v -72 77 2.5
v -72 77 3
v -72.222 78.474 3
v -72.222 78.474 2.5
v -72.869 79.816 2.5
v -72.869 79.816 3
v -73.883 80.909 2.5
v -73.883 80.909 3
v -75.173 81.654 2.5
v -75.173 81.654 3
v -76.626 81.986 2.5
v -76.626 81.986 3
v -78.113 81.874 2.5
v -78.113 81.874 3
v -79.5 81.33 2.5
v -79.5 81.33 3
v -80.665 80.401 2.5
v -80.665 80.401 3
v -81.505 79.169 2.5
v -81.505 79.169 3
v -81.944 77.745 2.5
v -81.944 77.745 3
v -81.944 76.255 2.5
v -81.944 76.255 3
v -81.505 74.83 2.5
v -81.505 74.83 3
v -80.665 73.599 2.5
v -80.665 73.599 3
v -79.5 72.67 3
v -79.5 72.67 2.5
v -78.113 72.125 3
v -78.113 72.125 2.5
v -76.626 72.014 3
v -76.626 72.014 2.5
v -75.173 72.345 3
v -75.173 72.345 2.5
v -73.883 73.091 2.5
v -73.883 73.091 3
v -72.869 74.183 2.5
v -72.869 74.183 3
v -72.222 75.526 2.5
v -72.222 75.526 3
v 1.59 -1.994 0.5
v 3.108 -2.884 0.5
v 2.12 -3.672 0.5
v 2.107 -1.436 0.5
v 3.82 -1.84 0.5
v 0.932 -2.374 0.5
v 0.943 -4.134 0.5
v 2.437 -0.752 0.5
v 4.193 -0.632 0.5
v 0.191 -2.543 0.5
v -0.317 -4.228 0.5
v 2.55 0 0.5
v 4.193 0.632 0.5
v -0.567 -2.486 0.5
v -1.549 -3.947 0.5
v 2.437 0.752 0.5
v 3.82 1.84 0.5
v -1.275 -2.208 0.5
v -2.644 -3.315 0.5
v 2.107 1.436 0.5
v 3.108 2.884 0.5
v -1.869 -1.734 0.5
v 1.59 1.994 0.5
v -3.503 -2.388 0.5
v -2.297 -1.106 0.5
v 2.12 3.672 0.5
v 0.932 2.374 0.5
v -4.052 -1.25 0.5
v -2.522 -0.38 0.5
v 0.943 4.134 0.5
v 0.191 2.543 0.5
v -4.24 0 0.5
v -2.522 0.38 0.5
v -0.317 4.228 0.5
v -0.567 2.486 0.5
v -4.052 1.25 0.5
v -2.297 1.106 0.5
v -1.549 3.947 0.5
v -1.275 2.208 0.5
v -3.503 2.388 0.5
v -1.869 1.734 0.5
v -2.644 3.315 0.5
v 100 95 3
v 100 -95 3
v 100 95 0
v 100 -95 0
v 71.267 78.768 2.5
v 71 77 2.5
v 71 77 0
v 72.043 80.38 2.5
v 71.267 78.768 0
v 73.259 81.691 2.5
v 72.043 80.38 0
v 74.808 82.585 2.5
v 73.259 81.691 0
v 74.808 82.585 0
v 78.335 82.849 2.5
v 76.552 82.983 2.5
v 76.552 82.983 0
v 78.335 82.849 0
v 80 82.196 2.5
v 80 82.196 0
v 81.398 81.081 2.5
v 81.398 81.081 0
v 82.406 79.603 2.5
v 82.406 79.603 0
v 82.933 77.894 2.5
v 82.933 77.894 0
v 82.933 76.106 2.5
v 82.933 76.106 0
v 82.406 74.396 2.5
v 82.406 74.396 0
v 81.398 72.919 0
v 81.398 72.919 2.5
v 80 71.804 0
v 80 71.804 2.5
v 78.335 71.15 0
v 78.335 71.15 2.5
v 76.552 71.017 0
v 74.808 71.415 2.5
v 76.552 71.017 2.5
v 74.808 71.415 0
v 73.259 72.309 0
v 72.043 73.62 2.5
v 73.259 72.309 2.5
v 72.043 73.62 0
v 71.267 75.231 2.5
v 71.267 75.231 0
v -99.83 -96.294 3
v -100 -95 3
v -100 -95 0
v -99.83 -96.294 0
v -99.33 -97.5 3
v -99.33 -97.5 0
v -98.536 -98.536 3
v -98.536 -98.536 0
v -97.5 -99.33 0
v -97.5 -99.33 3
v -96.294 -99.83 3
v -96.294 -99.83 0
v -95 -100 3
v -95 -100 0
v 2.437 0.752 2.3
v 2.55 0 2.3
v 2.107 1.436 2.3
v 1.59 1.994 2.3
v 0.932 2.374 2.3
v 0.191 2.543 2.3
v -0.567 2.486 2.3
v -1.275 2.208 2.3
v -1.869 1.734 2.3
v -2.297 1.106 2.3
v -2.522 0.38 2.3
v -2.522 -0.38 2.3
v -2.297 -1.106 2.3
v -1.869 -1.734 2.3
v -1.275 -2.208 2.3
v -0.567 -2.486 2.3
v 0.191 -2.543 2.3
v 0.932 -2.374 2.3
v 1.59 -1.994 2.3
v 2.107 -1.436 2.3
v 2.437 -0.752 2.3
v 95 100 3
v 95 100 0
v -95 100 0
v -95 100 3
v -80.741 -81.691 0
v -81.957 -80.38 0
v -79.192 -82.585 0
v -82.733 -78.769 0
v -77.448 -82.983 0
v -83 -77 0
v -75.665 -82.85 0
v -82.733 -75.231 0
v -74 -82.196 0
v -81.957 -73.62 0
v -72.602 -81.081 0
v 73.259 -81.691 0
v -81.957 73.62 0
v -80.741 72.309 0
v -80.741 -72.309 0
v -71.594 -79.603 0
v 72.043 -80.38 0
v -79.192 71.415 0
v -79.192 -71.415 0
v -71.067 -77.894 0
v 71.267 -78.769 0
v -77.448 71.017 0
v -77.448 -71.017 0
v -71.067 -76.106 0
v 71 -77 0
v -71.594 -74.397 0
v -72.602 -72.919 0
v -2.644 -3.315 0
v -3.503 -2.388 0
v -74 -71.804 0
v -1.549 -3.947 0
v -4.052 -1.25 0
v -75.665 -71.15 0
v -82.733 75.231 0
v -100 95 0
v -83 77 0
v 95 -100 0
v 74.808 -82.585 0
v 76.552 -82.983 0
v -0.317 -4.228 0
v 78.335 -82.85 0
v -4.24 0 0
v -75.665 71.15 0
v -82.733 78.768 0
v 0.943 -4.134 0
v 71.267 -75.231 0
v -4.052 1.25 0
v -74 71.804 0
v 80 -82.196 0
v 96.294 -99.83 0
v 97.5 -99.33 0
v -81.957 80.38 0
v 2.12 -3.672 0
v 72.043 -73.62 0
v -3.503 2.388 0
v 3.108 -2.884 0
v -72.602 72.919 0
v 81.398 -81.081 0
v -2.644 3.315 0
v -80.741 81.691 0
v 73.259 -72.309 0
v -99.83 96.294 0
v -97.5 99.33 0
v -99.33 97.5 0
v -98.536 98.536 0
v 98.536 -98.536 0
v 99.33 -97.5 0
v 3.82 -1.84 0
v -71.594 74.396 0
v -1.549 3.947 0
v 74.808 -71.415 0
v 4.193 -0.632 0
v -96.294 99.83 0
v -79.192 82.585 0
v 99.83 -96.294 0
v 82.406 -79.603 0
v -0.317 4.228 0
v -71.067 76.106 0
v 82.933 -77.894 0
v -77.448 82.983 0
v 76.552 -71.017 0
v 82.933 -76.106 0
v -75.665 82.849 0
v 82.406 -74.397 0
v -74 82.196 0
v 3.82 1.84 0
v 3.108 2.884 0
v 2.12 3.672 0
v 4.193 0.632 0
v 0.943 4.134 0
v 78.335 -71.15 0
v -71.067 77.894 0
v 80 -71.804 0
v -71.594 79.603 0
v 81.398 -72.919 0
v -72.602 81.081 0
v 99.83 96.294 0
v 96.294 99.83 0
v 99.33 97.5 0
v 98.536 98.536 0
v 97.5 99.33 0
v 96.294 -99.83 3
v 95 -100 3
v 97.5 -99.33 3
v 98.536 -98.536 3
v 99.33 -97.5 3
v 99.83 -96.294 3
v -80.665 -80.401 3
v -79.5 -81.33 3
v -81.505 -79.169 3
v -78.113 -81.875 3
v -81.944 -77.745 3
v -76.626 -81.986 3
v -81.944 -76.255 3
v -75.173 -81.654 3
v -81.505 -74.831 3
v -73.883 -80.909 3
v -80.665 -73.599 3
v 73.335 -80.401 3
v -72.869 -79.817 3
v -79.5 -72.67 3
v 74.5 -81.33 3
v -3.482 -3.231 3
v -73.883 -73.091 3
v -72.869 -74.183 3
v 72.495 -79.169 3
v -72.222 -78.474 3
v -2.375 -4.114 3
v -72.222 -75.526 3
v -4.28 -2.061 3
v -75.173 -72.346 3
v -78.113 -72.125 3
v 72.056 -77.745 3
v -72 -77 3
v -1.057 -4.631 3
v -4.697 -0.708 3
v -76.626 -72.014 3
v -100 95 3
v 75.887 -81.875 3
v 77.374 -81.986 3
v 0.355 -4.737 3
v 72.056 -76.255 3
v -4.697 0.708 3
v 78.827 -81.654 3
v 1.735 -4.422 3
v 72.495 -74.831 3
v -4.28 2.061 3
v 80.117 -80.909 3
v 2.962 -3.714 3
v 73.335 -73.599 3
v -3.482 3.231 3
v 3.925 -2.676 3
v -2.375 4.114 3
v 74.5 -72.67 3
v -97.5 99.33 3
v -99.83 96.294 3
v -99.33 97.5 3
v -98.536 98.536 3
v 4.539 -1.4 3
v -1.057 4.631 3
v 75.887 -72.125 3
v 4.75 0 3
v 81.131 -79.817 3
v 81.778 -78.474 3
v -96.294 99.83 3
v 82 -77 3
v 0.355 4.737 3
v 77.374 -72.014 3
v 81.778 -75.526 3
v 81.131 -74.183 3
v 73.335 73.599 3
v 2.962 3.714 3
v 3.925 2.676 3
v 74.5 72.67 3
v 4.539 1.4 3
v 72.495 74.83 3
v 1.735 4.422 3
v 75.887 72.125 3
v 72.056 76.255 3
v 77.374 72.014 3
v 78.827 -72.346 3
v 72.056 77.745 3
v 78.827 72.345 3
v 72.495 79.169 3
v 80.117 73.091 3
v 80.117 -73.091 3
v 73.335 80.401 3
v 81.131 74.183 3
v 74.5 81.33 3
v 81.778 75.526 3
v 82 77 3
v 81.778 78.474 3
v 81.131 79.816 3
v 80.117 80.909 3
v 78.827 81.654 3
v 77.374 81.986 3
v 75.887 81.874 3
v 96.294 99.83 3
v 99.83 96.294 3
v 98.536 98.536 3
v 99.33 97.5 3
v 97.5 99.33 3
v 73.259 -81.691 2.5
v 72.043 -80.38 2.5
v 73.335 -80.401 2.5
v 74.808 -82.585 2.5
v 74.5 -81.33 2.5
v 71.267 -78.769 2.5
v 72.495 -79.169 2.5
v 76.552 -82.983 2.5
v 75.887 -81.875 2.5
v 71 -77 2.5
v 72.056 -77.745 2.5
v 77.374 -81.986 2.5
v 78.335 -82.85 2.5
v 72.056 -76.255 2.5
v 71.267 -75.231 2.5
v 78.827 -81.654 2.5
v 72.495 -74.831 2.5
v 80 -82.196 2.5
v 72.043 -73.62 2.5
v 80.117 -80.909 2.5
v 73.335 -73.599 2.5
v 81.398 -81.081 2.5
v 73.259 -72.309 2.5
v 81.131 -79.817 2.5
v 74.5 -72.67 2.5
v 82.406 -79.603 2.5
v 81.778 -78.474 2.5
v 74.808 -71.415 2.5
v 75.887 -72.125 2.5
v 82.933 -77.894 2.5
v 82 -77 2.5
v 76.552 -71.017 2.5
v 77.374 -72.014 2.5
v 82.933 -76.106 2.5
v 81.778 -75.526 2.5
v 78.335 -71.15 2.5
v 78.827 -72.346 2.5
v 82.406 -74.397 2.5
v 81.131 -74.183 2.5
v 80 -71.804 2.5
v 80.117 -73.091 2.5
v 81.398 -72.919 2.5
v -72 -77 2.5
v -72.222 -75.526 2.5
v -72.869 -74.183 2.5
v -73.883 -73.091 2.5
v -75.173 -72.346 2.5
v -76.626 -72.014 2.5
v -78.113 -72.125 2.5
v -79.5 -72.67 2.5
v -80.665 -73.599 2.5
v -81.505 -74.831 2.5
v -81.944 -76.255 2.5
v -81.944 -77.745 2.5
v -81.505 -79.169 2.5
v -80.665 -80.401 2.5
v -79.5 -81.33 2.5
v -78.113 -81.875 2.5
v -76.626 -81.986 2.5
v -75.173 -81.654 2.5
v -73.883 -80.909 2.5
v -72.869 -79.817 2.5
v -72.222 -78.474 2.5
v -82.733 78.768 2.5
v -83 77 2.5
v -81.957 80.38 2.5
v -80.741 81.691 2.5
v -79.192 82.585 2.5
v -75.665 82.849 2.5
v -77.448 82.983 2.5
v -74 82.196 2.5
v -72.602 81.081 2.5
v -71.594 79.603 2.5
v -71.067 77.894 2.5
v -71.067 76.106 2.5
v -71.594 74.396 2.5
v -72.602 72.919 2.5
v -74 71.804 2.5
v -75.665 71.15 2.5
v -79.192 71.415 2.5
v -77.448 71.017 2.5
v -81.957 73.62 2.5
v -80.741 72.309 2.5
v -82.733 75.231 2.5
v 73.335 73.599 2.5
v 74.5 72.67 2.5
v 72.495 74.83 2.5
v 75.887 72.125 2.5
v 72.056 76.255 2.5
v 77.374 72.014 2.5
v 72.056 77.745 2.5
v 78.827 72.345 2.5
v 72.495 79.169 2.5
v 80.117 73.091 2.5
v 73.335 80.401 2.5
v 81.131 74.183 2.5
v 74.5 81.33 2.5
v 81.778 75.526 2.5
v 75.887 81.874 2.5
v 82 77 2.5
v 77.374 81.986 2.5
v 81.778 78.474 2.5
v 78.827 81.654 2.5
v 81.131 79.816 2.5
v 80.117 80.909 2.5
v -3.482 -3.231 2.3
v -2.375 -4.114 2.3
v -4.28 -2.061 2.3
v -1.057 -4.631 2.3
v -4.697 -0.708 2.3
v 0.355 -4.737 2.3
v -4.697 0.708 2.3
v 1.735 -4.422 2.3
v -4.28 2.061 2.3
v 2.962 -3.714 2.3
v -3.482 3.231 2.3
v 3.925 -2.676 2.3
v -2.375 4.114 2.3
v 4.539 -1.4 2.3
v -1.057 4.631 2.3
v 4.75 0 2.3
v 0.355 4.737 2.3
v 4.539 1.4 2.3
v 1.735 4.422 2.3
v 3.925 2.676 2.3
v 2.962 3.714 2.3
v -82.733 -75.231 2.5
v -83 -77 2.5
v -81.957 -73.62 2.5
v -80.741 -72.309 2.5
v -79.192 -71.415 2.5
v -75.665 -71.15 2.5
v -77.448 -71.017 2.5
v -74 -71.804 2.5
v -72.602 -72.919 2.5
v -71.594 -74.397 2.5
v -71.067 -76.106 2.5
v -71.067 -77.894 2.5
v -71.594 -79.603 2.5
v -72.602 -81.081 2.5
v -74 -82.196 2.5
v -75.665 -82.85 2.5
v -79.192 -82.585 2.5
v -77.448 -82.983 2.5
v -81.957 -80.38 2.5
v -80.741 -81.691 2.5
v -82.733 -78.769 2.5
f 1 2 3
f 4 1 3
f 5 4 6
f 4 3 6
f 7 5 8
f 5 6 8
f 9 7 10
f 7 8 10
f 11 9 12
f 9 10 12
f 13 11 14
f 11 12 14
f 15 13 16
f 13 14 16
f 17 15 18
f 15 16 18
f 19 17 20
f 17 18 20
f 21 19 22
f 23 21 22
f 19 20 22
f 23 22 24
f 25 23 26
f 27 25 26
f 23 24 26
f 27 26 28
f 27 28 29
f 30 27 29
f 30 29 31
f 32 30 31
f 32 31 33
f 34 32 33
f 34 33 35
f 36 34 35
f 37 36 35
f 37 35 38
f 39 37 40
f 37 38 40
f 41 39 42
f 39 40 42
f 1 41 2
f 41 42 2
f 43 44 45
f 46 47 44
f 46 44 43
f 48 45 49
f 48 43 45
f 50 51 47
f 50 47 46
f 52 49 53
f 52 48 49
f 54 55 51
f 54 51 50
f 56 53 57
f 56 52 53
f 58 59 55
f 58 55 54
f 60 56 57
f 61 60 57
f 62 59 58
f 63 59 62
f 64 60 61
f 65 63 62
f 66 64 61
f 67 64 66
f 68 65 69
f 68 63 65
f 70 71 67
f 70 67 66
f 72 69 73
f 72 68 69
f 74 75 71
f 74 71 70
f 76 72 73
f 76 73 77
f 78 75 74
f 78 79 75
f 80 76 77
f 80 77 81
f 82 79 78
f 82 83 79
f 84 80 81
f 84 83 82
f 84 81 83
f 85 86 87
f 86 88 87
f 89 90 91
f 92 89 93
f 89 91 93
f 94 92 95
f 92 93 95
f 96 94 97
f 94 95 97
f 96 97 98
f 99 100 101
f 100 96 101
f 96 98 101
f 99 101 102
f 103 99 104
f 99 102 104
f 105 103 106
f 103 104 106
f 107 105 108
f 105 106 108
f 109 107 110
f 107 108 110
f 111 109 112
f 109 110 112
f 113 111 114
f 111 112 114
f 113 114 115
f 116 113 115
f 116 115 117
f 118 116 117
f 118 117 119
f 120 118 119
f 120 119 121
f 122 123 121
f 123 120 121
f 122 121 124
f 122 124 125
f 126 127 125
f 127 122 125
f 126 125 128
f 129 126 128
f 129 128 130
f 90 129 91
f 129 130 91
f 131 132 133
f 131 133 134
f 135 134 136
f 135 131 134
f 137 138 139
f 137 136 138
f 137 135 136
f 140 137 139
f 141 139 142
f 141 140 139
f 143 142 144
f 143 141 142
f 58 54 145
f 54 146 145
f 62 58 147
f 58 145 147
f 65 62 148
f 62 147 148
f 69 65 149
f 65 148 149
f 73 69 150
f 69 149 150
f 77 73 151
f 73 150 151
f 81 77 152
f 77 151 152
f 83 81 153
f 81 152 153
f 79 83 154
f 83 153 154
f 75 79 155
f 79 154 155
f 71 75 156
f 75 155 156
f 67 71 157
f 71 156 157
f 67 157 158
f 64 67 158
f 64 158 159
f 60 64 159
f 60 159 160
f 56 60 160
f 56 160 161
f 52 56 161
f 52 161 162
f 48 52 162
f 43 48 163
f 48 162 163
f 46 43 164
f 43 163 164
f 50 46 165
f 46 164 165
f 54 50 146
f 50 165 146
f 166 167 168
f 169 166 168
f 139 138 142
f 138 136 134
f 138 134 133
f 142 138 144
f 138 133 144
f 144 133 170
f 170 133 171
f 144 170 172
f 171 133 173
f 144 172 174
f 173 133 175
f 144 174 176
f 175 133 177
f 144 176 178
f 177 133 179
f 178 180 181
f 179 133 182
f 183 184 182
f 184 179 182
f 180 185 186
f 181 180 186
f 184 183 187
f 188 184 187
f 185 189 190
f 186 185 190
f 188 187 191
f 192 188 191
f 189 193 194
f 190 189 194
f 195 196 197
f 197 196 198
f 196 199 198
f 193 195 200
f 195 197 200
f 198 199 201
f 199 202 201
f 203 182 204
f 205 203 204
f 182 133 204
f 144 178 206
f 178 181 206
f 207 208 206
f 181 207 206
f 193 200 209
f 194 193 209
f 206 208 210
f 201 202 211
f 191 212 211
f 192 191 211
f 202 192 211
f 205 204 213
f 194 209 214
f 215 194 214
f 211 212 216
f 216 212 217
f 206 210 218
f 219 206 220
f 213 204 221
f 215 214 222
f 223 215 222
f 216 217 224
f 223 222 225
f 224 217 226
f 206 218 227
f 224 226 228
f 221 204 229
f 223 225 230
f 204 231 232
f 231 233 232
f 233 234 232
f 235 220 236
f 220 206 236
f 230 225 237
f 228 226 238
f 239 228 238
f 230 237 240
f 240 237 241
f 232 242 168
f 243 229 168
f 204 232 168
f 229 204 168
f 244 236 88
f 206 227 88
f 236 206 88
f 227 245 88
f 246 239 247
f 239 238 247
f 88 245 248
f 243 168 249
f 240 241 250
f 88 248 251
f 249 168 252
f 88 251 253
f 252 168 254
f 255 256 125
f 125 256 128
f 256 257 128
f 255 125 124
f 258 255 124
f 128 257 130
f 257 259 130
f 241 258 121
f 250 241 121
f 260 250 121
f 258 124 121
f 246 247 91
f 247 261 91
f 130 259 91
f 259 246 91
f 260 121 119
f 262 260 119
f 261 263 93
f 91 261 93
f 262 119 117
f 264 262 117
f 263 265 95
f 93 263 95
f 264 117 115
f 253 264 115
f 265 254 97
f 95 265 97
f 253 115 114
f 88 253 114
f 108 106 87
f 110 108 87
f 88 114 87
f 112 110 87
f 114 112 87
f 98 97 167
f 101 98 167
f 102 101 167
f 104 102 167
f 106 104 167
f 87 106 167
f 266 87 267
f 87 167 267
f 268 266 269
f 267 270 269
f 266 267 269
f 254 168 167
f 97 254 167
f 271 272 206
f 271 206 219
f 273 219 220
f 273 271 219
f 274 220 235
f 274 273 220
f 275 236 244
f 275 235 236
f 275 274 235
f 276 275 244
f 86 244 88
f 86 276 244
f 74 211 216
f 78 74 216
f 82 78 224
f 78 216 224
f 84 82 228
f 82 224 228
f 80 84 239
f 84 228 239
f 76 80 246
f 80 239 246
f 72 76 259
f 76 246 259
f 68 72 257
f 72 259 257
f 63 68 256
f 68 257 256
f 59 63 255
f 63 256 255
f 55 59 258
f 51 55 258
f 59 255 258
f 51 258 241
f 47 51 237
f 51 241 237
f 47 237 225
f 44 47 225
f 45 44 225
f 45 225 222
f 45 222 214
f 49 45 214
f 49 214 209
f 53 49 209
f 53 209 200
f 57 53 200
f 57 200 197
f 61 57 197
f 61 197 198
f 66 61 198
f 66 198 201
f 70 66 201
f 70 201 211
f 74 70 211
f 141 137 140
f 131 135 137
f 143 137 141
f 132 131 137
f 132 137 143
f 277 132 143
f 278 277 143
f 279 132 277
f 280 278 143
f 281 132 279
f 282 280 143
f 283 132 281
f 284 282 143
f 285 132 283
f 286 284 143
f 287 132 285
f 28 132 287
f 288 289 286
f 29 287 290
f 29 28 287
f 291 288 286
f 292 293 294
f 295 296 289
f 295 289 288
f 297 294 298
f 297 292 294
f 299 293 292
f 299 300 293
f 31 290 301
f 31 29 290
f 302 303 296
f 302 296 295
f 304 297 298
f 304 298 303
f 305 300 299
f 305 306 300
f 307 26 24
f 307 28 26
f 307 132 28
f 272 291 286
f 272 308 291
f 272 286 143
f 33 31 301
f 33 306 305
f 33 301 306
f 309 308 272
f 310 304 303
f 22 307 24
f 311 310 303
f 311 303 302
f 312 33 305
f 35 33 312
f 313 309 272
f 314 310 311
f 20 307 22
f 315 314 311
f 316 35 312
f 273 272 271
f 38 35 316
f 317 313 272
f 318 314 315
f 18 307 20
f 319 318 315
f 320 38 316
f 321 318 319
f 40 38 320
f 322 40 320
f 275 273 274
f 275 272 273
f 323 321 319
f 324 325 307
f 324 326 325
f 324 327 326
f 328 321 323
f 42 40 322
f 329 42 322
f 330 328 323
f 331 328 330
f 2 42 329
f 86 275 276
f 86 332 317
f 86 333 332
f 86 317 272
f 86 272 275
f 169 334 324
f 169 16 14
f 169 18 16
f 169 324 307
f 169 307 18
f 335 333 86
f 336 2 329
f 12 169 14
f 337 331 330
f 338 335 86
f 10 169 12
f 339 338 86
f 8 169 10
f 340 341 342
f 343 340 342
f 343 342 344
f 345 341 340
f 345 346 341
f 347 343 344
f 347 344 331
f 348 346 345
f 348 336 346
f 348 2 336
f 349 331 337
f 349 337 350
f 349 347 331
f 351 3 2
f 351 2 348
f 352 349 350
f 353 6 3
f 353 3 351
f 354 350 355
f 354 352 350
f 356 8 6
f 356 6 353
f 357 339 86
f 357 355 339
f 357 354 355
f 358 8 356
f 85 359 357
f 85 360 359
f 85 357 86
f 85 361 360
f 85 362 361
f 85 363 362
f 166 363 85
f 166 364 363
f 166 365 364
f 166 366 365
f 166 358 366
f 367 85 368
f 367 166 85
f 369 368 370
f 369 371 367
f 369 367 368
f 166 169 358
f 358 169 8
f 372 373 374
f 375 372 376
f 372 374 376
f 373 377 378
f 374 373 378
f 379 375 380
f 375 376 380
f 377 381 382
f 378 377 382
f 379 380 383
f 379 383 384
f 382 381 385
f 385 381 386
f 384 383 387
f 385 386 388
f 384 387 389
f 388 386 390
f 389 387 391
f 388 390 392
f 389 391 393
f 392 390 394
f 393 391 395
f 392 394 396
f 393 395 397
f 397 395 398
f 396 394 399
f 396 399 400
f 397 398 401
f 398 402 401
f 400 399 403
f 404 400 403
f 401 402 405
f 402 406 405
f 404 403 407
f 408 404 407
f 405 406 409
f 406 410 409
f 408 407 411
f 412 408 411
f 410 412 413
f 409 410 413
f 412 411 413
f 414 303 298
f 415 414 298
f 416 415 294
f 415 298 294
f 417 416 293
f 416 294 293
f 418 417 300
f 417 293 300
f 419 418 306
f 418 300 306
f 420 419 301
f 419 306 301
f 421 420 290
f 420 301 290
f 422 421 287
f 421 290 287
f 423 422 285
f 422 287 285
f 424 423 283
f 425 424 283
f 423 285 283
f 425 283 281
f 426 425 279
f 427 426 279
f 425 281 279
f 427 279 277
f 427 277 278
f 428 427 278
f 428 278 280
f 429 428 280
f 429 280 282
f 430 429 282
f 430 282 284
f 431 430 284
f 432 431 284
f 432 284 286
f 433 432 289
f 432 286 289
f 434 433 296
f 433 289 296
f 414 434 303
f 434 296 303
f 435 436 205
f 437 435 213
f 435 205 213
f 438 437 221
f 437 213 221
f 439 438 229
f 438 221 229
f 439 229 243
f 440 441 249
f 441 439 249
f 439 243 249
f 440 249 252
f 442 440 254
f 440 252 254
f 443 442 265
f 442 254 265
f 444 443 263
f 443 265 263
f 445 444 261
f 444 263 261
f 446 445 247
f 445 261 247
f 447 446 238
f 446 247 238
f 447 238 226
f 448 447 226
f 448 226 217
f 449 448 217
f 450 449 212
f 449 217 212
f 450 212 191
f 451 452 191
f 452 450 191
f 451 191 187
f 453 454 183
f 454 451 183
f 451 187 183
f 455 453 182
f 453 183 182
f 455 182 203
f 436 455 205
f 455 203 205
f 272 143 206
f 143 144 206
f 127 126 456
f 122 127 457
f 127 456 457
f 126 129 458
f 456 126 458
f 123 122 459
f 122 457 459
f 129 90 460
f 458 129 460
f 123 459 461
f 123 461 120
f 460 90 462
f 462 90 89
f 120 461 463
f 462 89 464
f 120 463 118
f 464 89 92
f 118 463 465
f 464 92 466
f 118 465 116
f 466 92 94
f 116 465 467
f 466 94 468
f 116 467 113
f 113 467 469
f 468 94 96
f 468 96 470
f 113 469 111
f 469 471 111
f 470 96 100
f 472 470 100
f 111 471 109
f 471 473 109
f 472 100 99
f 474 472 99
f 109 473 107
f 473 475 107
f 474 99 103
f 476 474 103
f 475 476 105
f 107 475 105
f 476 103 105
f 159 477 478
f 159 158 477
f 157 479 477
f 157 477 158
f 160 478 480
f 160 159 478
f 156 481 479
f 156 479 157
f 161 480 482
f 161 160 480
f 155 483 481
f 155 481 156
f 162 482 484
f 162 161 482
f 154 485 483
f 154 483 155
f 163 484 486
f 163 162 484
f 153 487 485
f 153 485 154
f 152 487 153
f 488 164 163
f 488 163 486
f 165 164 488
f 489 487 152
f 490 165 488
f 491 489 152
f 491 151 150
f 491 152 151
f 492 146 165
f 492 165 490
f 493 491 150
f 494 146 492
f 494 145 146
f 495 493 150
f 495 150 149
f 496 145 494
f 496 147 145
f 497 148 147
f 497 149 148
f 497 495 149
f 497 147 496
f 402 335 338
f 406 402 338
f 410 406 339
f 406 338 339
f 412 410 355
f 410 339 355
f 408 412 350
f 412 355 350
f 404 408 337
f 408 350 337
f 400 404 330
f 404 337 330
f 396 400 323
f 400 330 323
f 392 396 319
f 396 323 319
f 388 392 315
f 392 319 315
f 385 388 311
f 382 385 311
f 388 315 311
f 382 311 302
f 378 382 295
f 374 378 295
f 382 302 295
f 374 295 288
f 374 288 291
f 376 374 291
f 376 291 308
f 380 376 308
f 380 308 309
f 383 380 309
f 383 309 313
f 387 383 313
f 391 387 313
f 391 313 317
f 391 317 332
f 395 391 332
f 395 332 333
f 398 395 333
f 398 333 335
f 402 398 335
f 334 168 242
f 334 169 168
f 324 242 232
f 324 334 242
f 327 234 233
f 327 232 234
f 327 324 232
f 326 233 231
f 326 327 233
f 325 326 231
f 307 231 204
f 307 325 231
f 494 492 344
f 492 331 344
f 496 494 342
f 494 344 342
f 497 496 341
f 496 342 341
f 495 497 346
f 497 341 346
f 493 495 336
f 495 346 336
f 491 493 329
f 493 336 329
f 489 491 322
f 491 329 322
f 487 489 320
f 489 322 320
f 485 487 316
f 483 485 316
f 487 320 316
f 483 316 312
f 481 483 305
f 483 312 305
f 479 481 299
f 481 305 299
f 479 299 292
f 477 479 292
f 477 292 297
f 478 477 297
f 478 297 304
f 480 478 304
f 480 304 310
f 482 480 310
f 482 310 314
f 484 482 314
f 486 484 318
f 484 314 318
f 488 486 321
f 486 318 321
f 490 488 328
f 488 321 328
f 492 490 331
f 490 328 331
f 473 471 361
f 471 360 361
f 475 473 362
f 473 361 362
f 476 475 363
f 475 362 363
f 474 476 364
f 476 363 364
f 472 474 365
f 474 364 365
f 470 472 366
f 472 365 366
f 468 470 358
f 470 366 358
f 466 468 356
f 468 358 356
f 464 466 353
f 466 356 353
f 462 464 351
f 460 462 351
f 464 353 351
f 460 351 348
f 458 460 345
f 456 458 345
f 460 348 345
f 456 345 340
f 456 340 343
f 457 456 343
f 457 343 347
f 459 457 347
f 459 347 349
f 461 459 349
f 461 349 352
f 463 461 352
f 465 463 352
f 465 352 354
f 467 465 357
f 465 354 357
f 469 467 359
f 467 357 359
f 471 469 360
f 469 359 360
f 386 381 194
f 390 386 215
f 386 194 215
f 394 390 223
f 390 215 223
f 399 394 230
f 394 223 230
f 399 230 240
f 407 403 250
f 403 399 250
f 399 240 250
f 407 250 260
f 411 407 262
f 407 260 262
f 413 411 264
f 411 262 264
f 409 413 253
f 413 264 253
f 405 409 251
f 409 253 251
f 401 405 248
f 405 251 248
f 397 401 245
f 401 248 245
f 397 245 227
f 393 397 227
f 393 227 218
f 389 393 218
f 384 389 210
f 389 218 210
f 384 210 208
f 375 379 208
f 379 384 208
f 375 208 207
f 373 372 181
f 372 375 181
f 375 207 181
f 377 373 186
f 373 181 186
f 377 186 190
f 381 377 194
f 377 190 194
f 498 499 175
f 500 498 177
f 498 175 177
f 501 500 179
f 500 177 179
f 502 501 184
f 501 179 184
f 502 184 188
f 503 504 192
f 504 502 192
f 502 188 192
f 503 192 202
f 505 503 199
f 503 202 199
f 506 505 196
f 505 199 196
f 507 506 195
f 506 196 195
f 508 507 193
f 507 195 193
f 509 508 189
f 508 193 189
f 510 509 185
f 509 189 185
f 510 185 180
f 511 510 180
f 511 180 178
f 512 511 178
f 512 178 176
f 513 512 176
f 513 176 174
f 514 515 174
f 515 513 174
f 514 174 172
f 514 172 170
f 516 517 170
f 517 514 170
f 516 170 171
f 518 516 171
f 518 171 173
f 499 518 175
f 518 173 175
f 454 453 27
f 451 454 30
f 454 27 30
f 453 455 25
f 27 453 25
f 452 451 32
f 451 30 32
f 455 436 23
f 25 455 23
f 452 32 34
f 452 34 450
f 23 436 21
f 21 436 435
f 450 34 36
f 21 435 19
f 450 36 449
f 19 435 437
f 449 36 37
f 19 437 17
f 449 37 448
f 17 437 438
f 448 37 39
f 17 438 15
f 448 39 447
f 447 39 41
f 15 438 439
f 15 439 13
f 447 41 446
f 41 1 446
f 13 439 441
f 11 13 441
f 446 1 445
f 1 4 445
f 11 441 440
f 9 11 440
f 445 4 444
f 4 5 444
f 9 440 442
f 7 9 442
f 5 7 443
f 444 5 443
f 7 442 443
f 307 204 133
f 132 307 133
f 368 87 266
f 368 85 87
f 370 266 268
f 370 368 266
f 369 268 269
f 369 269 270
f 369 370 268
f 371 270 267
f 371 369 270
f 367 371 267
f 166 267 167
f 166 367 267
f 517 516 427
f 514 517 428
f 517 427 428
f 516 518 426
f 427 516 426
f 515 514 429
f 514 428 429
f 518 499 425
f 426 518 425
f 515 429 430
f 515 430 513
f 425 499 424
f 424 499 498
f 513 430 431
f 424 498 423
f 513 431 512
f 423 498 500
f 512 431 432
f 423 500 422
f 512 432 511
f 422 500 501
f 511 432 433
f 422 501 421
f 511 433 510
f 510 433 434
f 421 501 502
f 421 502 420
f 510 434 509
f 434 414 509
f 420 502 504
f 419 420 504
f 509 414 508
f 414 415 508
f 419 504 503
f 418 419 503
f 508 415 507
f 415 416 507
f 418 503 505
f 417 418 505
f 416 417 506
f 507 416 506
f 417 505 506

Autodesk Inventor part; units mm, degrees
ref_plane "YZ Plane" through (0, 0, 0) normal (1, 0, 0) x (0, 1, 0)
ref_plane "XZ Plane" through (0, 0, 0) normal (0, 1, 0) x (-1, 0, 0)
ref_plane "XY Plane" through (0, 0, 0) normal (0, 0, 1) x (1, 0, 0)
sketch "Sketch1" plane through (0, 0, 0) normal (0, 0, 1) x (1, 0, 0)
  line L0 (100, 100) -> (-100, 100)
  line L1 (-100, 100) -> (-100, -100)
  line L2 (-100, -100) -> (100, -100)
  line L3 (100, -100) -> (100, 100)
  line L4 (100, 100) -> (-100, -100) construction
  line L5 (-100, 100) -> (100, -100) construction
  point P0 (0, 0)
  dimension "d0" = 200
  dimension "d1" = 200
extrude "Extrusion1" add sketch "Sketch1" along normal blind 3
fillet "Fillet1" radius 5 4 edges at (100, 100, 1.5) (-100, 100, 1.5) (100, -100, 1.5) (-100, -100, 1.5)
sketch "Sketch2" plane through (0, 0, 3) normal (0, 0, 1) x (1, 0, 0)
  circle A0 centre (0, 0) radius 2.55
  dimension "d5" = 5.1
extrude "Extrusion2" cut sketch "Sketch2" against normal blind 10
sketch "Sketch3" plane through (0, 0, 3) normal (0, 0, 1) x (1, 0, 0)
  circle A0 centre (0, 0) radius 4.75
  dimension "d10" = 9.5
extrude "Extrusion3" cut sketch "Sketch3" against normal blind 0.7
sketch "Sketch4" plane through (0, 0, 0) normal (0, 0, -1) x (-1, 0, 0)
  point P0 (0, 0)
sketch "Sketch5" plane through (0, 0, 0) normal (0, 0, -1) x (-1, 0, 0)
  point P0 (0, 0)
sketch "Sketch6" plane through (0, 0, 0) normal (0, 0, -1) x (-1, 0, 0)
  circle A0 centre (-77, 76.9998) radius 6
  line L0 (-93.7439, 99.9999) -> (-93.7439, -0.0001)
  line L1 (-93.7439, -0.0001) -> (78.7368, -0.0001)
  circle A1 centre (-77, -77) radius 6
  line L2 (95, -100) -> (-95, -100) projected
  line L3 (0, -100) -> (0, 48.6306)
  circle A2 centre (77, 76.9998) radius 6
  circle A3 centre (77, -77) radius 6
  line L4 (-100, -95) -> (-100, 95) projected
  point P0 (0, 0)
  point P1 (-93.7439, 89.8675)
  point P2 (-93.7439, 85.1564)
  dimension "d11" = 12
  dimension "d13" = 100
  dimension "d22" = 23
  dimension "d23" = 23
extrude "Extrusion4" cut sketch "Sketch6" against normal blind 10
sketch "Sketch8" plane through (0, 0, 0) normal (0, 0, -1) x (-1, 0, 0)
  circle A0 centre (0, 0) radius 4.24
  dimension "d19" = 8.48
extrude "Extrusion6" cut sketch "Sketch8" against normal blind 0.5
sketch "Sketch9" plane through (0, 0, 3) normal (0, 0, 1) x (1, 0, 0)
  circle A0 centre (-77, -77) radius 6 projected
  circle A1 centre (-77, -77) radius 5
  circle A2 centre (77, -77) radius 6 projected
  circle A3 centre (77, -77) radius 5
  circle A4 centre (77, 76.9998) radius 6 projected
  circle A5 centre (77, 76.9998) radius 5
  circle A6 centre (-77, 76.9998) radius 6 projected
  circle A7 centre (-77, 76.9998) radius 5
  point P0 (0, 0)
  dimension "d24" = 10
  dimension "d25" = 10
  dimension "d26" = 10
  dimension "d27" = 10
extrude "Extrusion7" add sketch "Sketch9" against normal blind 0.5
properties part number "Plate" material "Aluminum 6061"
